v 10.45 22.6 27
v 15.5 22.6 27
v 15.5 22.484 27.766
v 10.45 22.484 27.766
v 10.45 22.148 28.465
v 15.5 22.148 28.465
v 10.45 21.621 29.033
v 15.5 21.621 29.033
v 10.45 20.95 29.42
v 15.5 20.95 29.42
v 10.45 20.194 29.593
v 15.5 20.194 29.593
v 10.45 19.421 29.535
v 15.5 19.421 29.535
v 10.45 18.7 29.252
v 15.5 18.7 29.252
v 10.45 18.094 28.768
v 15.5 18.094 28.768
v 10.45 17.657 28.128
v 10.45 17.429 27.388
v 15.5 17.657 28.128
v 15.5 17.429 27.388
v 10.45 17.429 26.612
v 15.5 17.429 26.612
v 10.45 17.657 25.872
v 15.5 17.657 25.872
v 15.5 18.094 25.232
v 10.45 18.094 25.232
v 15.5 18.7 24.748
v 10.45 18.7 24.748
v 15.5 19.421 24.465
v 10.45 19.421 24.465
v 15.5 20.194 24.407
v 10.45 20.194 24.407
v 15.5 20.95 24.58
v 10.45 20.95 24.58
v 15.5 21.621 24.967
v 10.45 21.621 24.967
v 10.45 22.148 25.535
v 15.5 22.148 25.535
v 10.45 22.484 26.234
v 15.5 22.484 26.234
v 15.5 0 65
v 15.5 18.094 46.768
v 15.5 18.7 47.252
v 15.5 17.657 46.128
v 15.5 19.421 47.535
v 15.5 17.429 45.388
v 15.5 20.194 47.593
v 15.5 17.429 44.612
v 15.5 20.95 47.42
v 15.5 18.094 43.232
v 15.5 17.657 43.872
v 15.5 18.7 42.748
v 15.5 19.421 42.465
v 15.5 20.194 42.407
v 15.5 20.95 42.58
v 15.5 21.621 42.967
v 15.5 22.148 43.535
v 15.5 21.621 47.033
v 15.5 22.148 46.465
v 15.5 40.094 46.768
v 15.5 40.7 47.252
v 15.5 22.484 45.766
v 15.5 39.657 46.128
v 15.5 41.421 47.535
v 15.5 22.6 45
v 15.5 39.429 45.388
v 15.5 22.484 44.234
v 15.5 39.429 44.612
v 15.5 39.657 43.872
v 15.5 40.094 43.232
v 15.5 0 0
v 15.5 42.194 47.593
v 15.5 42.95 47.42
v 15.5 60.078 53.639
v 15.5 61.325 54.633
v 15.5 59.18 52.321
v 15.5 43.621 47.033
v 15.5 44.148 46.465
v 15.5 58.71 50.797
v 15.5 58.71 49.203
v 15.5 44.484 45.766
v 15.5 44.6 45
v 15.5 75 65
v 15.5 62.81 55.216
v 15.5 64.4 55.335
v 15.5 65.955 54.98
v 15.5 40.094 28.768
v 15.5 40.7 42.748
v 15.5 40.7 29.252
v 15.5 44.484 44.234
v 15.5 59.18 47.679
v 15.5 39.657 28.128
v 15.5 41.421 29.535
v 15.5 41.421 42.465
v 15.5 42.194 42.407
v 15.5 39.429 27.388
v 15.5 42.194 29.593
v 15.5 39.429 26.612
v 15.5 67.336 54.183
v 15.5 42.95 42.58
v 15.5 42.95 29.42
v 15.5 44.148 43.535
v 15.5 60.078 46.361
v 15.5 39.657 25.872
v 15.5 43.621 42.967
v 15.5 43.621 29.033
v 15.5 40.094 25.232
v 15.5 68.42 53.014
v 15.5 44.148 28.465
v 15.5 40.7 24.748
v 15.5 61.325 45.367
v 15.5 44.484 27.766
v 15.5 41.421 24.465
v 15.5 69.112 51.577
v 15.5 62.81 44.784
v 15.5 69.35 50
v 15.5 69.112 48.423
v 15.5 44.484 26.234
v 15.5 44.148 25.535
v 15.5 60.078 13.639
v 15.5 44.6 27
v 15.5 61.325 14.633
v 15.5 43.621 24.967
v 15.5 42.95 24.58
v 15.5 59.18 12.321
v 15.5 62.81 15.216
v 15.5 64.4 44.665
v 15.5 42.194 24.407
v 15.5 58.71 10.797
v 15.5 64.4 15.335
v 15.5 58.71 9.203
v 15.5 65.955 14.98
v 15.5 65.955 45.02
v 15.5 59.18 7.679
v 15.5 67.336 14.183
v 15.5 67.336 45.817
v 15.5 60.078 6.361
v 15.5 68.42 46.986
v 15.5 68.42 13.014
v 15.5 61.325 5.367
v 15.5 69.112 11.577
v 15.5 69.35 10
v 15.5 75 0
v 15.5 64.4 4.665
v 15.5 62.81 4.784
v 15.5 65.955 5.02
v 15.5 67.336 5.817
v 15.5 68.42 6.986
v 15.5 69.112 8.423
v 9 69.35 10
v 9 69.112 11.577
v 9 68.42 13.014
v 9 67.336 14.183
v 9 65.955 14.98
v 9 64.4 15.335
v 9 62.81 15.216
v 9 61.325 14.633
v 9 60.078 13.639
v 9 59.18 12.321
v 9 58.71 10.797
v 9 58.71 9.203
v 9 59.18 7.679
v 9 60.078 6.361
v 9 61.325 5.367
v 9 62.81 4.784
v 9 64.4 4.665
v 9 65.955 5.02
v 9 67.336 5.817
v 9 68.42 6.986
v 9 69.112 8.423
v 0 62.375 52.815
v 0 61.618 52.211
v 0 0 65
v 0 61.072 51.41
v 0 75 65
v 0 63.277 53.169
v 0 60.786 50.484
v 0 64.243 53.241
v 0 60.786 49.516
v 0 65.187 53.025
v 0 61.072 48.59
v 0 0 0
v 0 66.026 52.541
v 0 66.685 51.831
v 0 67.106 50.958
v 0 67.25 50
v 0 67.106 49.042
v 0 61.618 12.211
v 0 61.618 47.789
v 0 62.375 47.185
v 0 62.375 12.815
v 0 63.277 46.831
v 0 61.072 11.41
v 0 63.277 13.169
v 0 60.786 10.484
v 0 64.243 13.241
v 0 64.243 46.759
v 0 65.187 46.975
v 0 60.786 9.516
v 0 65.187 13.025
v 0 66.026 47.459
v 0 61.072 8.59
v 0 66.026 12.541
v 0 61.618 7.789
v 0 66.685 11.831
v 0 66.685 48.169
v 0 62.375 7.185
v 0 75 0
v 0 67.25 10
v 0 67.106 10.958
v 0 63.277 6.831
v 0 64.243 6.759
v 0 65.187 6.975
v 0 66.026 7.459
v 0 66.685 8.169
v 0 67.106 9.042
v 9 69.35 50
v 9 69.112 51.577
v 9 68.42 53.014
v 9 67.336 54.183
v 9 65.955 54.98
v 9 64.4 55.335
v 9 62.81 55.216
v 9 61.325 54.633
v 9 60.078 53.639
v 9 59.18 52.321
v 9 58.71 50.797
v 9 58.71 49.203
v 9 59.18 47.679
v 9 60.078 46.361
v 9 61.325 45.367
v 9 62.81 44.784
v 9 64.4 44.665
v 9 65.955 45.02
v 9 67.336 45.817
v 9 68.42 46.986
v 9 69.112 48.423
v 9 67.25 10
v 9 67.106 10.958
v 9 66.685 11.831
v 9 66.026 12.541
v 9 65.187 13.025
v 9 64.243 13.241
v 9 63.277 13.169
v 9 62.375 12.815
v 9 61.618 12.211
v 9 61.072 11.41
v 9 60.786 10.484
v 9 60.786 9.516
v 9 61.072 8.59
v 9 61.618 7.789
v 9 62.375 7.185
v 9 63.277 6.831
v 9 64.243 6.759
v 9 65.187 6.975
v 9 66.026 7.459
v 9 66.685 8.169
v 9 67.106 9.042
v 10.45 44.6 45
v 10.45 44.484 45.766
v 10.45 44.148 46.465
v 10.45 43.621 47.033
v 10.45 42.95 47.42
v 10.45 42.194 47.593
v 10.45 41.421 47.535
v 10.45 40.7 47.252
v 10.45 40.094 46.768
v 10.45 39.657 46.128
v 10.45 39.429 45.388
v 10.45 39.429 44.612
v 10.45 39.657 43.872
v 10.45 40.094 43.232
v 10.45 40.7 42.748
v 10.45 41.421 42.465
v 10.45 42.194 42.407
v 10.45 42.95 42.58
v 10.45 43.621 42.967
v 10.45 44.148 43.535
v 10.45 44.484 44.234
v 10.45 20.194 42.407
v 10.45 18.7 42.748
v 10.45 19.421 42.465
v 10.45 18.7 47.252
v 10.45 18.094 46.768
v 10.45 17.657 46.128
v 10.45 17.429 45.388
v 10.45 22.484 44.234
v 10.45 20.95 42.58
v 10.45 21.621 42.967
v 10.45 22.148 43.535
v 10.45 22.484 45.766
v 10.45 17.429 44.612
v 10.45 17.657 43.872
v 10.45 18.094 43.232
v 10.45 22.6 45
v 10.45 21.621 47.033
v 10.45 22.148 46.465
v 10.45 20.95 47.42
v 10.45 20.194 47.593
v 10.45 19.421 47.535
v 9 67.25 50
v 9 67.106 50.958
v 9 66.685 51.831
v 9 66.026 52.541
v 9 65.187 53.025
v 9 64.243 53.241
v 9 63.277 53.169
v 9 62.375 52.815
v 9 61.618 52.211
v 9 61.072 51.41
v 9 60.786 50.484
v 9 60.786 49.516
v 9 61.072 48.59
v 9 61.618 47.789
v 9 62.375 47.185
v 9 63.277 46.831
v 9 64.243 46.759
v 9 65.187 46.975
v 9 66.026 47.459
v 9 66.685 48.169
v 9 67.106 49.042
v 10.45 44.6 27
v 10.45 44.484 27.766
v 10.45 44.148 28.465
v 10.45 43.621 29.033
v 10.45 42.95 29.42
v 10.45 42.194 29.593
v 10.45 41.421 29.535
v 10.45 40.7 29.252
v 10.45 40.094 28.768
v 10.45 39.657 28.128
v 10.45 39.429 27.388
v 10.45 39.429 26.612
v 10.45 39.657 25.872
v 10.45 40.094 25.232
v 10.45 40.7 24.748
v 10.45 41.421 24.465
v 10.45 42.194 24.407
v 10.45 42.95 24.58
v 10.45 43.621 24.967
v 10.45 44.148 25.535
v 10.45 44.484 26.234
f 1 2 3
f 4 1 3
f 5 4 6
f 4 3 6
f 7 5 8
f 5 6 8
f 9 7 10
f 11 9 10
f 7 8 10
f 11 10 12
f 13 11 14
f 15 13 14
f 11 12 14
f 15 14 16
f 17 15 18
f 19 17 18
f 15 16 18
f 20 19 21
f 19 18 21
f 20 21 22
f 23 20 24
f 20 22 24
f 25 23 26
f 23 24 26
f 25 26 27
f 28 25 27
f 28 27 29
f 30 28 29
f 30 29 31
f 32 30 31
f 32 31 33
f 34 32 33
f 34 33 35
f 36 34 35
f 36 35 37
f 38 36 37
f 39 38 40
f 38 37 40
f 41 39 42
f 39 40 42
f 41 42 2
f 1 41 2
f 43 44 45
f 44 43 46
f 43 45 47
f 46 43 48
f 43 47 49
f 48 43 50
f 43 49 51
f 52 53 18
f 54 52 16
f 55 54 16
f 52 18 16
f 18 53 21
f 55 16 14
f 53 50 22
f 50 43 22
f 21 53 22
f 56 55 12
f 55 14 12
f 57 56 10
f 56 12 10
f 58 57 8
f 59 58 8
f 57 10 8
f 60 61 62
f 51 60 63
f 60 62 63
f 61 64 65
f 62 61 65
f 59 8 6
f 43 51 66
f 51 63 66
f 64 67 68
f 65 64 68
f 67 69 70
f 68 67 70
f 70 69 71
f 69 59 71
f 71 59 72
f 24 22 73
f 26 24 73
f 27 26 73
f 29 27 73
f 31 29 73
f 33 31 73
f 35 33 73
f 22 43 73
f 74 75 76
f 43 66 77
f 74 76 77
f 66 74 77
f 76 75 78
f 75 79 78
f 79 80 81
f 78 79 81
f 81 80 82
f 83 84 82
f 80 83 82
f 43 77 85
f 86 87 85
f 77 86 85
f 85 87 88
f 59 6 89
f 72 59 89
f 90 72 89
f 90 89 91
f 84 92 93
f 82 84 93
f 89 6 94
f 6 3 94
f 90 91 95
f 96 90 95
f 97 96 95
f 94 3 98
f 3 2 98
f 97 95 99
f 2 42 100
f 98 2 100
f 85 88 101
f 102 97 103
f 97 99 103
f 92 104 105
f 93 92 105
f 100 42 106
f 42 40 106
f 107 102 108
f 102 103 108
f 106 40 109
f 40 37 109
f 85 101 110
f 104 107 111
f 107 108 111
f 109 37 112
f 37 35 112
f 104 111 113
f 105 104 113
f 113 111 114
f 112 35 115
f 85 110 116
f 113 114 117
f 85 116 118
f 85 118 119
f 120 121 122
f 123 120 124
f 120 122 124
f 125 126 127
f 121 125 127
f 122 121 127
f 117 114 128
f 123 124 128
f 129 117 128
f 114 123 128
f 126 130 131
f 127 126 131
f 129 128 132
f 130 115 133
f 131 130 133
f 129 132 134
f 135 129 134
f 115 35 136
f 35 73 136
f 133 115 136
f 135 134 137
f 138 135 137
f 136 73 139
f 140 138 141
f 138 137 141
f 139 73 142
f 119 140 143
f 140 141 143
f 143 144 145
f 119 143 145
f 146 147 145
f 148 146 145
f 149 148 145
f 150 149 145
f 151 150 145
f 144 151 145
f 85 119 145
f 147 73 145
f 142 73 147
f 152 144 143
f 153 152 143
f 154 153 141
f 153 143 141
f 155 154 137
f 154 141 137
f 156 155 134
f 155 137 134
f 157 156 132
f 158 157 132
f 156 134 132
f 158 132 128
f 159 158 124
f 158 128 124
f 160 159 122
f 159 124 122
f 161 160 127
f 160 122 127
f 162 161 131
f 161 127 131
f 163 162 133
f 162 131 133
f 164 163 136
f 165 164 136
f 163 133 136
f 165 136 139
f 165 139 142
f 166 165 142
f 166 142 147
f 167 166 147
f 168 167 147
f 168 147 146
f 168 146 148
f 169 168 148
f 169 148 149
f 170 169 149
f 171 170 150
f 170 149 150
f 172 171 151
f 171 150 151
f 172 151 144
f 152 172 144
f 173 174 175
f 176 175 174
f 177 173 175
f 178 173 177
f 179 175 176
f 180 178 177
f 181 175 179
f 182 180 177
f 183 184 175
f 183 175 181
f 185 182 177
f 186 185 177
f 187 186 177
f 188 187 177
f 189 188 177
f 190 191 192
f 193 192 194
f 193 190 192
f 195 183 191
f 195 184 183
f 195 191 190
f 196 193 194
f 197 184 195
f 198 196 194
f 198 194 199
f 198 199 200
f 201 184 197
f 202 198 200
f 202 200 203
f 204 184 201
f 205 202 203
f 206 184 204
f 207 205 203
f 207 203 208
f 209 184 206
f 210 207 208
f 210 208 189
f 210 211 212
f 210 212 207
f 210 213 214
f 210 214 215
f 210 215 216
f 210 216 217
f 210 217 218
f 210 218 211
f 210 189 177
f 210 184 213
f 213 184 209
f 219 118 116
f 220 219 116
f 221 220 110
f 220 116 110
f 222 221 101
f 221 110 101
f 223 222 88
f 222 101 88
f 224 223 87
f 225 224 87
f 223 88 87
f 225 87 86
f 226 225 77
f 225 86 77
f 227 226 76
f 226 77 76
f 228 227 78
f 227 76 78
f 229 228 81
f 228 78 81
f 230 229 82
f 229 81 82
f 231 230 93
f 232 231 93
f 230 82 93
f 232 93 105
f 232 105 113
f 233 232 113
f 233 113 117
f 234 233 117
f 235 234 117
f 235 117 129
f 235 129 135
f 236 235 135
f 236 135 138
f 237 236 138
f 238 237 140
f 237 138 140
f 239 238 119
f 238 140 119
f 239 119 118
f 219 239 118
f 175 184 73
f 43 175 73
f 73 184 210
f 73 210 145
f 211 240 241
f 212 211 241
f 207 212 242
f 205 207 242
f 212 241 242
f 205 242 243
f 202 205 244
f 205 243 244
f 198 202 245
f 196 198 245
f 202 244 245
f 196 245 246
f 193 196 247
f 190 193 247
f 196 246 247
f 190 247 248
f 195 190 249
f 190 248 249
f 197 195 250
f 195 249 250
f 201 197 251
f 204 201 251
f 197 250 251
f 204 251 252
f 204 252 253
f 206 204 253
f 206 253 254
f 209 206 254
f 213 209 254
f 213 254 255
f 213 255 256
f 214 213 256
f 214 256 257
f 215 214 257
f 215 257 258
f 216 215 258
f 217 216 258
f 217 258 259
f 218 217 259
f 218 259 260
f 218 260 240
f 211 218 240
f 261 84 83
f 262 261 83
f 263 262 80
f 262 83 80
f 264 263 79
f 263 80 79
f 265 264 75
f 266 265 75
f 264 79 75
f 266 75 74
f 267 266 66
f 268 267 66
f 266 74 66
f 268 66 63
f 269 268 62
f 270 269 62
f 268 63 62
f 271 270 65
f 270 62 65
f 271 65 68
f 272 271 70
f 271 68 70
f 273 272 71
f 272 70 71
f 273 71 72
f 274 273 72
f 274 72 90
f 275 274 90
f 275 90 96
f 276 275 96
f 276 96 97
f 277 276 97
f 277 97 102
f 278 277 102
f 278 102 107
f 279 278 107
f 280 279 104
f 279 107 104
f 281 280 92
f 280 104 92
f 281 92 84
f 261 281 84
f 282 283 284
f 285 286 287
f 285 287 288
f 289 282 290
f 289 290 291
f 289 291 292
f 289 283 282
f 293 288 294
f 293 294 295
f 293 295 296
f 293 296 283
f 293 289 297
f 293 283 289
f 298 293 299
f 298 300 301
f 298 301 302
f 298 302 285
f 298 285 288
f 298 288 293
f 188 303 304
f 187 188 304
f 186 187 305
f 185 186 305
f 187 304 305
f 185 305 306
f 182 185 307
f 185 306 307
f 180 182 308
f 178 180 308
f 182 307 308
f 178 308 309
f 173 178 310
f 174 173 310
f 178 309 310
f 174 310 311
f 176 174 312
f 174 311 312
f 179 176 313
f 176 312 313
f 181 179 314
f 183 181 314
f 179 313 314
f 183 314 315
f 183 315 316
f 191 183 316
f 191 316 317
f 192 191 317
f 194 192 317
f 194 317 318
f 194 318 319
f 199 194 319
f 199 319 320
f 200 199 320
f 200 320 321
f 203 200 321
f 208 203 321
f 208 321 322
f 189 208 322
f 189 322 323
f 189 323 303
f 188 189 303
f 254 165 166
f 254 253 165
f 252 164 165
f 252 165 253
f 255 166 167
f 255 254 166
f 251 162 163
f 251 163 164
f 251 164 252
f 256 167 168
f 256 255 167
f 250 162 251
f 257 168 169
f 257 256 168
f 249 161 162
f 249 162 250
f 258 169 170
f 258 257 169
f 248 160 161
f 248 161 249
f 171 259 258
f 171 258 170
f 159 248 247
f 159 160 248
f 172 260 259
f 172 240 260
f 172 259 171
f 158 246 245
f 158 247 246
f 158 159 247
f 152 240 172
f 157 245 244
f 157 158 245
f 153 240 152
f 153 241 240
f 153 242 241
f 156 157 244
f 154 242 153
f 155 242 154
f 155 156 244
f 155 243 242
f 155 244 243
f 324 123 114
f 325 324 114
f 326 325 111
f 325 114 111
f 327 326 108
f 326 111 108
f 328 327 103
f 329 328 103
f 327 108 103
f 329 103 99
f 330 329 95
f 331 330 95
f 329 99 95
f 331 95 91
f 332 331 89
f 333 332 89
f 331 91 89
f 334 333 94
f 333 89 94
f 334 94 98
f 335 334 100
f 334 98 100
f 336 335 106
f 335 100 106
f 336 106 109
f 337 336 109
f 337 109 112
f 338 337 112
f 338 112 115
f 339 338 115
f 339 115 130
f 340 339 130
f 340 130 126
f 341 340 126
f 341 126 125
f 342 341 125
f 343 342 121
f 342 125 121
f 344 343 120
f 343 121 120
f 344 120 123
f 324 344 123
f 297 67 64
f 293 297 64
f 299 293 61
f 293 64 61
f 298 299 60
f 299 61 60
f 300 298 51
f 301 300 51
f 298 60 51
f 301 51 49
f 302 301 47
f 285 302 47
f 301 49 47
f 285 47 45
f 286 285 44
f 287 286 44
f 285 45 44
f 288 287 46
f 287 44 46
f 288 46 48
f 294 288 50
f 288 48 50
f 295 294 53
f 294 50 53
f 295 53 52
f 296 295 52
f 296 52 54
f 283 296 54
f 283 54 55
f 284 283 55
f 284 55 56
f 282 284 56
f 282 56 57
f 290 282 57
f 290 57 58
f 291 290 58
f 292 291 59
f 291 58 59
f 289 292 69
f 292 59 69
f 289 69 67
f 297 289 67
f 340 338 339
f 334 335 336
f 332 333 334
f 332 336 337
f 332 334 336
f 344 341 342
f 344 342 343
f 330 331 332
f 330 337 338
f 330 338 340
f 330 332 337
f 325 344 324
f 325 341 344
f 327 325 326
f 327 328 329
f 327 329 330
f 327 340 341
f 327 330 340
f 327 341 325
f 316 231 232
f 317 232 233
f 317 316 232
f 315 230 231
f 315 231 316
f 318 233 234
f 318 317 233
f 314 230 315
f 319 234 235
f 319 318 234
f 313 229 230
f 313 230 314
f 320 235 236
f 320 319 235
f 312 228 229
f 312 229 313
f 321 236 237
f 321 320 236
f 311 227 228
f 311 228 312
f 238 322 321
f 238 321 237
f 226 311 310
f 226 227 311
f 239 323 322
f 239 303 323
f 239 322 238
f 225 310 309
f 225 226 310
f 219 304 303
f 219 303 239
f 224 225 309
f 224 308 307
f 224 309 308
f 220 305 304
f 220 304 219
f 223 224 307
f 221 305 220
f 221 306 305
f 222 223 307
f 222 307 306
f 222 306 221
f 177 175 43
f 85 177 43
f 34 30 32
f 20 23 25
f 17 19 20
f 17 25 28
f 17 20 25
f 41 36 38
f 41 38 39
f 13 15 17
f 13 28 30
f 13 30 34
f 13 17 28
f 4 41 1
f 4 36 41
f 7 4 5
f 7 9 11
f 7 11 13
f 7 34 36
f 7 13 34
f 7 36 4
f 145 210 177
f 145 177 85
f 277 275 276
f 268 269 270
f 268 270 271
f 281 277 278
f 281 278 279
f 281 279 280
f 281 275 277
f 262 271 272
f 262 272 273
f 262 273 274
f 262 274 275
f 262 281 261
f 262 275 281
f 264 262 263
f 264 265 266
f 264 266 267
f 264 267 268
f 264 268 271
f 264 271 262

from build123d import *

# Parameters (mm, degrees)
SKETCH_W        = 15.5
SKETCH_H        = 75
PAD_DEPTH       = 65
SKETCH001_R     = 3.25
POCKET_DEPTH    = 17
SKETCH002_R     = 2.6
POCKET001_DEPTH = 5.05
SKETCH003_R     = 5.35
POCKET002_DEPTH = 6.5


with BuildPart() as part:
    # Sketch → Pad (new body)
    with BuildSketch(Plane.XY):
        with Locations((7.75, 37.5)):
            Rectangle(SKETCH_W, SKETCH_H)
    extrude(amount=PAD_DEPTH)

    # Sketch001 (on Face2 of Pad) → Pocket (cut)
    with BuildSketch(Plane.YZ.offset(15.5)):
        with Locations((64, 50)):
            Circle(SKETCH001_R)
        with Locations((64, 10)):
            Circle(SKETCH001_R)
    extrude(amount=-POCKET_DEPTH, mode=Mode.SUBTRACT)

    # Sketch002 (on Face3 of Pocket) → Pocket001 (cut)
    with BuildSketch(Plane.YZ.offset(15.5)):
        with Locations((20, 45)):
            Circle(SKETCH002_R)
        with Locations((42, 45)):
            Circle(SKETCH002_R)
        with Locations((20, 27)):
            Circle(SKETCH002_R)
        with Locations((42, 27)):
            Circle(SKETCH002_R)
    extrude(amount=-POCKET001_DEPTH, mode=Mode.SUBTRACT)

    # Sketch003 (on Face3 of Pocket001) → Pocket002 (cut)
    with BuildSketch(Plane.YZ.offset(15.5)):
        with Locations((64, 50)):
            Circle(SKETCH003_R)
        with Locations((64, 10)):
            Circle(SKETCH003_R)
    extrude(amount=-POCKET002_DEPTH, mode=Mode.SUBTRACT)


solid = part.part
